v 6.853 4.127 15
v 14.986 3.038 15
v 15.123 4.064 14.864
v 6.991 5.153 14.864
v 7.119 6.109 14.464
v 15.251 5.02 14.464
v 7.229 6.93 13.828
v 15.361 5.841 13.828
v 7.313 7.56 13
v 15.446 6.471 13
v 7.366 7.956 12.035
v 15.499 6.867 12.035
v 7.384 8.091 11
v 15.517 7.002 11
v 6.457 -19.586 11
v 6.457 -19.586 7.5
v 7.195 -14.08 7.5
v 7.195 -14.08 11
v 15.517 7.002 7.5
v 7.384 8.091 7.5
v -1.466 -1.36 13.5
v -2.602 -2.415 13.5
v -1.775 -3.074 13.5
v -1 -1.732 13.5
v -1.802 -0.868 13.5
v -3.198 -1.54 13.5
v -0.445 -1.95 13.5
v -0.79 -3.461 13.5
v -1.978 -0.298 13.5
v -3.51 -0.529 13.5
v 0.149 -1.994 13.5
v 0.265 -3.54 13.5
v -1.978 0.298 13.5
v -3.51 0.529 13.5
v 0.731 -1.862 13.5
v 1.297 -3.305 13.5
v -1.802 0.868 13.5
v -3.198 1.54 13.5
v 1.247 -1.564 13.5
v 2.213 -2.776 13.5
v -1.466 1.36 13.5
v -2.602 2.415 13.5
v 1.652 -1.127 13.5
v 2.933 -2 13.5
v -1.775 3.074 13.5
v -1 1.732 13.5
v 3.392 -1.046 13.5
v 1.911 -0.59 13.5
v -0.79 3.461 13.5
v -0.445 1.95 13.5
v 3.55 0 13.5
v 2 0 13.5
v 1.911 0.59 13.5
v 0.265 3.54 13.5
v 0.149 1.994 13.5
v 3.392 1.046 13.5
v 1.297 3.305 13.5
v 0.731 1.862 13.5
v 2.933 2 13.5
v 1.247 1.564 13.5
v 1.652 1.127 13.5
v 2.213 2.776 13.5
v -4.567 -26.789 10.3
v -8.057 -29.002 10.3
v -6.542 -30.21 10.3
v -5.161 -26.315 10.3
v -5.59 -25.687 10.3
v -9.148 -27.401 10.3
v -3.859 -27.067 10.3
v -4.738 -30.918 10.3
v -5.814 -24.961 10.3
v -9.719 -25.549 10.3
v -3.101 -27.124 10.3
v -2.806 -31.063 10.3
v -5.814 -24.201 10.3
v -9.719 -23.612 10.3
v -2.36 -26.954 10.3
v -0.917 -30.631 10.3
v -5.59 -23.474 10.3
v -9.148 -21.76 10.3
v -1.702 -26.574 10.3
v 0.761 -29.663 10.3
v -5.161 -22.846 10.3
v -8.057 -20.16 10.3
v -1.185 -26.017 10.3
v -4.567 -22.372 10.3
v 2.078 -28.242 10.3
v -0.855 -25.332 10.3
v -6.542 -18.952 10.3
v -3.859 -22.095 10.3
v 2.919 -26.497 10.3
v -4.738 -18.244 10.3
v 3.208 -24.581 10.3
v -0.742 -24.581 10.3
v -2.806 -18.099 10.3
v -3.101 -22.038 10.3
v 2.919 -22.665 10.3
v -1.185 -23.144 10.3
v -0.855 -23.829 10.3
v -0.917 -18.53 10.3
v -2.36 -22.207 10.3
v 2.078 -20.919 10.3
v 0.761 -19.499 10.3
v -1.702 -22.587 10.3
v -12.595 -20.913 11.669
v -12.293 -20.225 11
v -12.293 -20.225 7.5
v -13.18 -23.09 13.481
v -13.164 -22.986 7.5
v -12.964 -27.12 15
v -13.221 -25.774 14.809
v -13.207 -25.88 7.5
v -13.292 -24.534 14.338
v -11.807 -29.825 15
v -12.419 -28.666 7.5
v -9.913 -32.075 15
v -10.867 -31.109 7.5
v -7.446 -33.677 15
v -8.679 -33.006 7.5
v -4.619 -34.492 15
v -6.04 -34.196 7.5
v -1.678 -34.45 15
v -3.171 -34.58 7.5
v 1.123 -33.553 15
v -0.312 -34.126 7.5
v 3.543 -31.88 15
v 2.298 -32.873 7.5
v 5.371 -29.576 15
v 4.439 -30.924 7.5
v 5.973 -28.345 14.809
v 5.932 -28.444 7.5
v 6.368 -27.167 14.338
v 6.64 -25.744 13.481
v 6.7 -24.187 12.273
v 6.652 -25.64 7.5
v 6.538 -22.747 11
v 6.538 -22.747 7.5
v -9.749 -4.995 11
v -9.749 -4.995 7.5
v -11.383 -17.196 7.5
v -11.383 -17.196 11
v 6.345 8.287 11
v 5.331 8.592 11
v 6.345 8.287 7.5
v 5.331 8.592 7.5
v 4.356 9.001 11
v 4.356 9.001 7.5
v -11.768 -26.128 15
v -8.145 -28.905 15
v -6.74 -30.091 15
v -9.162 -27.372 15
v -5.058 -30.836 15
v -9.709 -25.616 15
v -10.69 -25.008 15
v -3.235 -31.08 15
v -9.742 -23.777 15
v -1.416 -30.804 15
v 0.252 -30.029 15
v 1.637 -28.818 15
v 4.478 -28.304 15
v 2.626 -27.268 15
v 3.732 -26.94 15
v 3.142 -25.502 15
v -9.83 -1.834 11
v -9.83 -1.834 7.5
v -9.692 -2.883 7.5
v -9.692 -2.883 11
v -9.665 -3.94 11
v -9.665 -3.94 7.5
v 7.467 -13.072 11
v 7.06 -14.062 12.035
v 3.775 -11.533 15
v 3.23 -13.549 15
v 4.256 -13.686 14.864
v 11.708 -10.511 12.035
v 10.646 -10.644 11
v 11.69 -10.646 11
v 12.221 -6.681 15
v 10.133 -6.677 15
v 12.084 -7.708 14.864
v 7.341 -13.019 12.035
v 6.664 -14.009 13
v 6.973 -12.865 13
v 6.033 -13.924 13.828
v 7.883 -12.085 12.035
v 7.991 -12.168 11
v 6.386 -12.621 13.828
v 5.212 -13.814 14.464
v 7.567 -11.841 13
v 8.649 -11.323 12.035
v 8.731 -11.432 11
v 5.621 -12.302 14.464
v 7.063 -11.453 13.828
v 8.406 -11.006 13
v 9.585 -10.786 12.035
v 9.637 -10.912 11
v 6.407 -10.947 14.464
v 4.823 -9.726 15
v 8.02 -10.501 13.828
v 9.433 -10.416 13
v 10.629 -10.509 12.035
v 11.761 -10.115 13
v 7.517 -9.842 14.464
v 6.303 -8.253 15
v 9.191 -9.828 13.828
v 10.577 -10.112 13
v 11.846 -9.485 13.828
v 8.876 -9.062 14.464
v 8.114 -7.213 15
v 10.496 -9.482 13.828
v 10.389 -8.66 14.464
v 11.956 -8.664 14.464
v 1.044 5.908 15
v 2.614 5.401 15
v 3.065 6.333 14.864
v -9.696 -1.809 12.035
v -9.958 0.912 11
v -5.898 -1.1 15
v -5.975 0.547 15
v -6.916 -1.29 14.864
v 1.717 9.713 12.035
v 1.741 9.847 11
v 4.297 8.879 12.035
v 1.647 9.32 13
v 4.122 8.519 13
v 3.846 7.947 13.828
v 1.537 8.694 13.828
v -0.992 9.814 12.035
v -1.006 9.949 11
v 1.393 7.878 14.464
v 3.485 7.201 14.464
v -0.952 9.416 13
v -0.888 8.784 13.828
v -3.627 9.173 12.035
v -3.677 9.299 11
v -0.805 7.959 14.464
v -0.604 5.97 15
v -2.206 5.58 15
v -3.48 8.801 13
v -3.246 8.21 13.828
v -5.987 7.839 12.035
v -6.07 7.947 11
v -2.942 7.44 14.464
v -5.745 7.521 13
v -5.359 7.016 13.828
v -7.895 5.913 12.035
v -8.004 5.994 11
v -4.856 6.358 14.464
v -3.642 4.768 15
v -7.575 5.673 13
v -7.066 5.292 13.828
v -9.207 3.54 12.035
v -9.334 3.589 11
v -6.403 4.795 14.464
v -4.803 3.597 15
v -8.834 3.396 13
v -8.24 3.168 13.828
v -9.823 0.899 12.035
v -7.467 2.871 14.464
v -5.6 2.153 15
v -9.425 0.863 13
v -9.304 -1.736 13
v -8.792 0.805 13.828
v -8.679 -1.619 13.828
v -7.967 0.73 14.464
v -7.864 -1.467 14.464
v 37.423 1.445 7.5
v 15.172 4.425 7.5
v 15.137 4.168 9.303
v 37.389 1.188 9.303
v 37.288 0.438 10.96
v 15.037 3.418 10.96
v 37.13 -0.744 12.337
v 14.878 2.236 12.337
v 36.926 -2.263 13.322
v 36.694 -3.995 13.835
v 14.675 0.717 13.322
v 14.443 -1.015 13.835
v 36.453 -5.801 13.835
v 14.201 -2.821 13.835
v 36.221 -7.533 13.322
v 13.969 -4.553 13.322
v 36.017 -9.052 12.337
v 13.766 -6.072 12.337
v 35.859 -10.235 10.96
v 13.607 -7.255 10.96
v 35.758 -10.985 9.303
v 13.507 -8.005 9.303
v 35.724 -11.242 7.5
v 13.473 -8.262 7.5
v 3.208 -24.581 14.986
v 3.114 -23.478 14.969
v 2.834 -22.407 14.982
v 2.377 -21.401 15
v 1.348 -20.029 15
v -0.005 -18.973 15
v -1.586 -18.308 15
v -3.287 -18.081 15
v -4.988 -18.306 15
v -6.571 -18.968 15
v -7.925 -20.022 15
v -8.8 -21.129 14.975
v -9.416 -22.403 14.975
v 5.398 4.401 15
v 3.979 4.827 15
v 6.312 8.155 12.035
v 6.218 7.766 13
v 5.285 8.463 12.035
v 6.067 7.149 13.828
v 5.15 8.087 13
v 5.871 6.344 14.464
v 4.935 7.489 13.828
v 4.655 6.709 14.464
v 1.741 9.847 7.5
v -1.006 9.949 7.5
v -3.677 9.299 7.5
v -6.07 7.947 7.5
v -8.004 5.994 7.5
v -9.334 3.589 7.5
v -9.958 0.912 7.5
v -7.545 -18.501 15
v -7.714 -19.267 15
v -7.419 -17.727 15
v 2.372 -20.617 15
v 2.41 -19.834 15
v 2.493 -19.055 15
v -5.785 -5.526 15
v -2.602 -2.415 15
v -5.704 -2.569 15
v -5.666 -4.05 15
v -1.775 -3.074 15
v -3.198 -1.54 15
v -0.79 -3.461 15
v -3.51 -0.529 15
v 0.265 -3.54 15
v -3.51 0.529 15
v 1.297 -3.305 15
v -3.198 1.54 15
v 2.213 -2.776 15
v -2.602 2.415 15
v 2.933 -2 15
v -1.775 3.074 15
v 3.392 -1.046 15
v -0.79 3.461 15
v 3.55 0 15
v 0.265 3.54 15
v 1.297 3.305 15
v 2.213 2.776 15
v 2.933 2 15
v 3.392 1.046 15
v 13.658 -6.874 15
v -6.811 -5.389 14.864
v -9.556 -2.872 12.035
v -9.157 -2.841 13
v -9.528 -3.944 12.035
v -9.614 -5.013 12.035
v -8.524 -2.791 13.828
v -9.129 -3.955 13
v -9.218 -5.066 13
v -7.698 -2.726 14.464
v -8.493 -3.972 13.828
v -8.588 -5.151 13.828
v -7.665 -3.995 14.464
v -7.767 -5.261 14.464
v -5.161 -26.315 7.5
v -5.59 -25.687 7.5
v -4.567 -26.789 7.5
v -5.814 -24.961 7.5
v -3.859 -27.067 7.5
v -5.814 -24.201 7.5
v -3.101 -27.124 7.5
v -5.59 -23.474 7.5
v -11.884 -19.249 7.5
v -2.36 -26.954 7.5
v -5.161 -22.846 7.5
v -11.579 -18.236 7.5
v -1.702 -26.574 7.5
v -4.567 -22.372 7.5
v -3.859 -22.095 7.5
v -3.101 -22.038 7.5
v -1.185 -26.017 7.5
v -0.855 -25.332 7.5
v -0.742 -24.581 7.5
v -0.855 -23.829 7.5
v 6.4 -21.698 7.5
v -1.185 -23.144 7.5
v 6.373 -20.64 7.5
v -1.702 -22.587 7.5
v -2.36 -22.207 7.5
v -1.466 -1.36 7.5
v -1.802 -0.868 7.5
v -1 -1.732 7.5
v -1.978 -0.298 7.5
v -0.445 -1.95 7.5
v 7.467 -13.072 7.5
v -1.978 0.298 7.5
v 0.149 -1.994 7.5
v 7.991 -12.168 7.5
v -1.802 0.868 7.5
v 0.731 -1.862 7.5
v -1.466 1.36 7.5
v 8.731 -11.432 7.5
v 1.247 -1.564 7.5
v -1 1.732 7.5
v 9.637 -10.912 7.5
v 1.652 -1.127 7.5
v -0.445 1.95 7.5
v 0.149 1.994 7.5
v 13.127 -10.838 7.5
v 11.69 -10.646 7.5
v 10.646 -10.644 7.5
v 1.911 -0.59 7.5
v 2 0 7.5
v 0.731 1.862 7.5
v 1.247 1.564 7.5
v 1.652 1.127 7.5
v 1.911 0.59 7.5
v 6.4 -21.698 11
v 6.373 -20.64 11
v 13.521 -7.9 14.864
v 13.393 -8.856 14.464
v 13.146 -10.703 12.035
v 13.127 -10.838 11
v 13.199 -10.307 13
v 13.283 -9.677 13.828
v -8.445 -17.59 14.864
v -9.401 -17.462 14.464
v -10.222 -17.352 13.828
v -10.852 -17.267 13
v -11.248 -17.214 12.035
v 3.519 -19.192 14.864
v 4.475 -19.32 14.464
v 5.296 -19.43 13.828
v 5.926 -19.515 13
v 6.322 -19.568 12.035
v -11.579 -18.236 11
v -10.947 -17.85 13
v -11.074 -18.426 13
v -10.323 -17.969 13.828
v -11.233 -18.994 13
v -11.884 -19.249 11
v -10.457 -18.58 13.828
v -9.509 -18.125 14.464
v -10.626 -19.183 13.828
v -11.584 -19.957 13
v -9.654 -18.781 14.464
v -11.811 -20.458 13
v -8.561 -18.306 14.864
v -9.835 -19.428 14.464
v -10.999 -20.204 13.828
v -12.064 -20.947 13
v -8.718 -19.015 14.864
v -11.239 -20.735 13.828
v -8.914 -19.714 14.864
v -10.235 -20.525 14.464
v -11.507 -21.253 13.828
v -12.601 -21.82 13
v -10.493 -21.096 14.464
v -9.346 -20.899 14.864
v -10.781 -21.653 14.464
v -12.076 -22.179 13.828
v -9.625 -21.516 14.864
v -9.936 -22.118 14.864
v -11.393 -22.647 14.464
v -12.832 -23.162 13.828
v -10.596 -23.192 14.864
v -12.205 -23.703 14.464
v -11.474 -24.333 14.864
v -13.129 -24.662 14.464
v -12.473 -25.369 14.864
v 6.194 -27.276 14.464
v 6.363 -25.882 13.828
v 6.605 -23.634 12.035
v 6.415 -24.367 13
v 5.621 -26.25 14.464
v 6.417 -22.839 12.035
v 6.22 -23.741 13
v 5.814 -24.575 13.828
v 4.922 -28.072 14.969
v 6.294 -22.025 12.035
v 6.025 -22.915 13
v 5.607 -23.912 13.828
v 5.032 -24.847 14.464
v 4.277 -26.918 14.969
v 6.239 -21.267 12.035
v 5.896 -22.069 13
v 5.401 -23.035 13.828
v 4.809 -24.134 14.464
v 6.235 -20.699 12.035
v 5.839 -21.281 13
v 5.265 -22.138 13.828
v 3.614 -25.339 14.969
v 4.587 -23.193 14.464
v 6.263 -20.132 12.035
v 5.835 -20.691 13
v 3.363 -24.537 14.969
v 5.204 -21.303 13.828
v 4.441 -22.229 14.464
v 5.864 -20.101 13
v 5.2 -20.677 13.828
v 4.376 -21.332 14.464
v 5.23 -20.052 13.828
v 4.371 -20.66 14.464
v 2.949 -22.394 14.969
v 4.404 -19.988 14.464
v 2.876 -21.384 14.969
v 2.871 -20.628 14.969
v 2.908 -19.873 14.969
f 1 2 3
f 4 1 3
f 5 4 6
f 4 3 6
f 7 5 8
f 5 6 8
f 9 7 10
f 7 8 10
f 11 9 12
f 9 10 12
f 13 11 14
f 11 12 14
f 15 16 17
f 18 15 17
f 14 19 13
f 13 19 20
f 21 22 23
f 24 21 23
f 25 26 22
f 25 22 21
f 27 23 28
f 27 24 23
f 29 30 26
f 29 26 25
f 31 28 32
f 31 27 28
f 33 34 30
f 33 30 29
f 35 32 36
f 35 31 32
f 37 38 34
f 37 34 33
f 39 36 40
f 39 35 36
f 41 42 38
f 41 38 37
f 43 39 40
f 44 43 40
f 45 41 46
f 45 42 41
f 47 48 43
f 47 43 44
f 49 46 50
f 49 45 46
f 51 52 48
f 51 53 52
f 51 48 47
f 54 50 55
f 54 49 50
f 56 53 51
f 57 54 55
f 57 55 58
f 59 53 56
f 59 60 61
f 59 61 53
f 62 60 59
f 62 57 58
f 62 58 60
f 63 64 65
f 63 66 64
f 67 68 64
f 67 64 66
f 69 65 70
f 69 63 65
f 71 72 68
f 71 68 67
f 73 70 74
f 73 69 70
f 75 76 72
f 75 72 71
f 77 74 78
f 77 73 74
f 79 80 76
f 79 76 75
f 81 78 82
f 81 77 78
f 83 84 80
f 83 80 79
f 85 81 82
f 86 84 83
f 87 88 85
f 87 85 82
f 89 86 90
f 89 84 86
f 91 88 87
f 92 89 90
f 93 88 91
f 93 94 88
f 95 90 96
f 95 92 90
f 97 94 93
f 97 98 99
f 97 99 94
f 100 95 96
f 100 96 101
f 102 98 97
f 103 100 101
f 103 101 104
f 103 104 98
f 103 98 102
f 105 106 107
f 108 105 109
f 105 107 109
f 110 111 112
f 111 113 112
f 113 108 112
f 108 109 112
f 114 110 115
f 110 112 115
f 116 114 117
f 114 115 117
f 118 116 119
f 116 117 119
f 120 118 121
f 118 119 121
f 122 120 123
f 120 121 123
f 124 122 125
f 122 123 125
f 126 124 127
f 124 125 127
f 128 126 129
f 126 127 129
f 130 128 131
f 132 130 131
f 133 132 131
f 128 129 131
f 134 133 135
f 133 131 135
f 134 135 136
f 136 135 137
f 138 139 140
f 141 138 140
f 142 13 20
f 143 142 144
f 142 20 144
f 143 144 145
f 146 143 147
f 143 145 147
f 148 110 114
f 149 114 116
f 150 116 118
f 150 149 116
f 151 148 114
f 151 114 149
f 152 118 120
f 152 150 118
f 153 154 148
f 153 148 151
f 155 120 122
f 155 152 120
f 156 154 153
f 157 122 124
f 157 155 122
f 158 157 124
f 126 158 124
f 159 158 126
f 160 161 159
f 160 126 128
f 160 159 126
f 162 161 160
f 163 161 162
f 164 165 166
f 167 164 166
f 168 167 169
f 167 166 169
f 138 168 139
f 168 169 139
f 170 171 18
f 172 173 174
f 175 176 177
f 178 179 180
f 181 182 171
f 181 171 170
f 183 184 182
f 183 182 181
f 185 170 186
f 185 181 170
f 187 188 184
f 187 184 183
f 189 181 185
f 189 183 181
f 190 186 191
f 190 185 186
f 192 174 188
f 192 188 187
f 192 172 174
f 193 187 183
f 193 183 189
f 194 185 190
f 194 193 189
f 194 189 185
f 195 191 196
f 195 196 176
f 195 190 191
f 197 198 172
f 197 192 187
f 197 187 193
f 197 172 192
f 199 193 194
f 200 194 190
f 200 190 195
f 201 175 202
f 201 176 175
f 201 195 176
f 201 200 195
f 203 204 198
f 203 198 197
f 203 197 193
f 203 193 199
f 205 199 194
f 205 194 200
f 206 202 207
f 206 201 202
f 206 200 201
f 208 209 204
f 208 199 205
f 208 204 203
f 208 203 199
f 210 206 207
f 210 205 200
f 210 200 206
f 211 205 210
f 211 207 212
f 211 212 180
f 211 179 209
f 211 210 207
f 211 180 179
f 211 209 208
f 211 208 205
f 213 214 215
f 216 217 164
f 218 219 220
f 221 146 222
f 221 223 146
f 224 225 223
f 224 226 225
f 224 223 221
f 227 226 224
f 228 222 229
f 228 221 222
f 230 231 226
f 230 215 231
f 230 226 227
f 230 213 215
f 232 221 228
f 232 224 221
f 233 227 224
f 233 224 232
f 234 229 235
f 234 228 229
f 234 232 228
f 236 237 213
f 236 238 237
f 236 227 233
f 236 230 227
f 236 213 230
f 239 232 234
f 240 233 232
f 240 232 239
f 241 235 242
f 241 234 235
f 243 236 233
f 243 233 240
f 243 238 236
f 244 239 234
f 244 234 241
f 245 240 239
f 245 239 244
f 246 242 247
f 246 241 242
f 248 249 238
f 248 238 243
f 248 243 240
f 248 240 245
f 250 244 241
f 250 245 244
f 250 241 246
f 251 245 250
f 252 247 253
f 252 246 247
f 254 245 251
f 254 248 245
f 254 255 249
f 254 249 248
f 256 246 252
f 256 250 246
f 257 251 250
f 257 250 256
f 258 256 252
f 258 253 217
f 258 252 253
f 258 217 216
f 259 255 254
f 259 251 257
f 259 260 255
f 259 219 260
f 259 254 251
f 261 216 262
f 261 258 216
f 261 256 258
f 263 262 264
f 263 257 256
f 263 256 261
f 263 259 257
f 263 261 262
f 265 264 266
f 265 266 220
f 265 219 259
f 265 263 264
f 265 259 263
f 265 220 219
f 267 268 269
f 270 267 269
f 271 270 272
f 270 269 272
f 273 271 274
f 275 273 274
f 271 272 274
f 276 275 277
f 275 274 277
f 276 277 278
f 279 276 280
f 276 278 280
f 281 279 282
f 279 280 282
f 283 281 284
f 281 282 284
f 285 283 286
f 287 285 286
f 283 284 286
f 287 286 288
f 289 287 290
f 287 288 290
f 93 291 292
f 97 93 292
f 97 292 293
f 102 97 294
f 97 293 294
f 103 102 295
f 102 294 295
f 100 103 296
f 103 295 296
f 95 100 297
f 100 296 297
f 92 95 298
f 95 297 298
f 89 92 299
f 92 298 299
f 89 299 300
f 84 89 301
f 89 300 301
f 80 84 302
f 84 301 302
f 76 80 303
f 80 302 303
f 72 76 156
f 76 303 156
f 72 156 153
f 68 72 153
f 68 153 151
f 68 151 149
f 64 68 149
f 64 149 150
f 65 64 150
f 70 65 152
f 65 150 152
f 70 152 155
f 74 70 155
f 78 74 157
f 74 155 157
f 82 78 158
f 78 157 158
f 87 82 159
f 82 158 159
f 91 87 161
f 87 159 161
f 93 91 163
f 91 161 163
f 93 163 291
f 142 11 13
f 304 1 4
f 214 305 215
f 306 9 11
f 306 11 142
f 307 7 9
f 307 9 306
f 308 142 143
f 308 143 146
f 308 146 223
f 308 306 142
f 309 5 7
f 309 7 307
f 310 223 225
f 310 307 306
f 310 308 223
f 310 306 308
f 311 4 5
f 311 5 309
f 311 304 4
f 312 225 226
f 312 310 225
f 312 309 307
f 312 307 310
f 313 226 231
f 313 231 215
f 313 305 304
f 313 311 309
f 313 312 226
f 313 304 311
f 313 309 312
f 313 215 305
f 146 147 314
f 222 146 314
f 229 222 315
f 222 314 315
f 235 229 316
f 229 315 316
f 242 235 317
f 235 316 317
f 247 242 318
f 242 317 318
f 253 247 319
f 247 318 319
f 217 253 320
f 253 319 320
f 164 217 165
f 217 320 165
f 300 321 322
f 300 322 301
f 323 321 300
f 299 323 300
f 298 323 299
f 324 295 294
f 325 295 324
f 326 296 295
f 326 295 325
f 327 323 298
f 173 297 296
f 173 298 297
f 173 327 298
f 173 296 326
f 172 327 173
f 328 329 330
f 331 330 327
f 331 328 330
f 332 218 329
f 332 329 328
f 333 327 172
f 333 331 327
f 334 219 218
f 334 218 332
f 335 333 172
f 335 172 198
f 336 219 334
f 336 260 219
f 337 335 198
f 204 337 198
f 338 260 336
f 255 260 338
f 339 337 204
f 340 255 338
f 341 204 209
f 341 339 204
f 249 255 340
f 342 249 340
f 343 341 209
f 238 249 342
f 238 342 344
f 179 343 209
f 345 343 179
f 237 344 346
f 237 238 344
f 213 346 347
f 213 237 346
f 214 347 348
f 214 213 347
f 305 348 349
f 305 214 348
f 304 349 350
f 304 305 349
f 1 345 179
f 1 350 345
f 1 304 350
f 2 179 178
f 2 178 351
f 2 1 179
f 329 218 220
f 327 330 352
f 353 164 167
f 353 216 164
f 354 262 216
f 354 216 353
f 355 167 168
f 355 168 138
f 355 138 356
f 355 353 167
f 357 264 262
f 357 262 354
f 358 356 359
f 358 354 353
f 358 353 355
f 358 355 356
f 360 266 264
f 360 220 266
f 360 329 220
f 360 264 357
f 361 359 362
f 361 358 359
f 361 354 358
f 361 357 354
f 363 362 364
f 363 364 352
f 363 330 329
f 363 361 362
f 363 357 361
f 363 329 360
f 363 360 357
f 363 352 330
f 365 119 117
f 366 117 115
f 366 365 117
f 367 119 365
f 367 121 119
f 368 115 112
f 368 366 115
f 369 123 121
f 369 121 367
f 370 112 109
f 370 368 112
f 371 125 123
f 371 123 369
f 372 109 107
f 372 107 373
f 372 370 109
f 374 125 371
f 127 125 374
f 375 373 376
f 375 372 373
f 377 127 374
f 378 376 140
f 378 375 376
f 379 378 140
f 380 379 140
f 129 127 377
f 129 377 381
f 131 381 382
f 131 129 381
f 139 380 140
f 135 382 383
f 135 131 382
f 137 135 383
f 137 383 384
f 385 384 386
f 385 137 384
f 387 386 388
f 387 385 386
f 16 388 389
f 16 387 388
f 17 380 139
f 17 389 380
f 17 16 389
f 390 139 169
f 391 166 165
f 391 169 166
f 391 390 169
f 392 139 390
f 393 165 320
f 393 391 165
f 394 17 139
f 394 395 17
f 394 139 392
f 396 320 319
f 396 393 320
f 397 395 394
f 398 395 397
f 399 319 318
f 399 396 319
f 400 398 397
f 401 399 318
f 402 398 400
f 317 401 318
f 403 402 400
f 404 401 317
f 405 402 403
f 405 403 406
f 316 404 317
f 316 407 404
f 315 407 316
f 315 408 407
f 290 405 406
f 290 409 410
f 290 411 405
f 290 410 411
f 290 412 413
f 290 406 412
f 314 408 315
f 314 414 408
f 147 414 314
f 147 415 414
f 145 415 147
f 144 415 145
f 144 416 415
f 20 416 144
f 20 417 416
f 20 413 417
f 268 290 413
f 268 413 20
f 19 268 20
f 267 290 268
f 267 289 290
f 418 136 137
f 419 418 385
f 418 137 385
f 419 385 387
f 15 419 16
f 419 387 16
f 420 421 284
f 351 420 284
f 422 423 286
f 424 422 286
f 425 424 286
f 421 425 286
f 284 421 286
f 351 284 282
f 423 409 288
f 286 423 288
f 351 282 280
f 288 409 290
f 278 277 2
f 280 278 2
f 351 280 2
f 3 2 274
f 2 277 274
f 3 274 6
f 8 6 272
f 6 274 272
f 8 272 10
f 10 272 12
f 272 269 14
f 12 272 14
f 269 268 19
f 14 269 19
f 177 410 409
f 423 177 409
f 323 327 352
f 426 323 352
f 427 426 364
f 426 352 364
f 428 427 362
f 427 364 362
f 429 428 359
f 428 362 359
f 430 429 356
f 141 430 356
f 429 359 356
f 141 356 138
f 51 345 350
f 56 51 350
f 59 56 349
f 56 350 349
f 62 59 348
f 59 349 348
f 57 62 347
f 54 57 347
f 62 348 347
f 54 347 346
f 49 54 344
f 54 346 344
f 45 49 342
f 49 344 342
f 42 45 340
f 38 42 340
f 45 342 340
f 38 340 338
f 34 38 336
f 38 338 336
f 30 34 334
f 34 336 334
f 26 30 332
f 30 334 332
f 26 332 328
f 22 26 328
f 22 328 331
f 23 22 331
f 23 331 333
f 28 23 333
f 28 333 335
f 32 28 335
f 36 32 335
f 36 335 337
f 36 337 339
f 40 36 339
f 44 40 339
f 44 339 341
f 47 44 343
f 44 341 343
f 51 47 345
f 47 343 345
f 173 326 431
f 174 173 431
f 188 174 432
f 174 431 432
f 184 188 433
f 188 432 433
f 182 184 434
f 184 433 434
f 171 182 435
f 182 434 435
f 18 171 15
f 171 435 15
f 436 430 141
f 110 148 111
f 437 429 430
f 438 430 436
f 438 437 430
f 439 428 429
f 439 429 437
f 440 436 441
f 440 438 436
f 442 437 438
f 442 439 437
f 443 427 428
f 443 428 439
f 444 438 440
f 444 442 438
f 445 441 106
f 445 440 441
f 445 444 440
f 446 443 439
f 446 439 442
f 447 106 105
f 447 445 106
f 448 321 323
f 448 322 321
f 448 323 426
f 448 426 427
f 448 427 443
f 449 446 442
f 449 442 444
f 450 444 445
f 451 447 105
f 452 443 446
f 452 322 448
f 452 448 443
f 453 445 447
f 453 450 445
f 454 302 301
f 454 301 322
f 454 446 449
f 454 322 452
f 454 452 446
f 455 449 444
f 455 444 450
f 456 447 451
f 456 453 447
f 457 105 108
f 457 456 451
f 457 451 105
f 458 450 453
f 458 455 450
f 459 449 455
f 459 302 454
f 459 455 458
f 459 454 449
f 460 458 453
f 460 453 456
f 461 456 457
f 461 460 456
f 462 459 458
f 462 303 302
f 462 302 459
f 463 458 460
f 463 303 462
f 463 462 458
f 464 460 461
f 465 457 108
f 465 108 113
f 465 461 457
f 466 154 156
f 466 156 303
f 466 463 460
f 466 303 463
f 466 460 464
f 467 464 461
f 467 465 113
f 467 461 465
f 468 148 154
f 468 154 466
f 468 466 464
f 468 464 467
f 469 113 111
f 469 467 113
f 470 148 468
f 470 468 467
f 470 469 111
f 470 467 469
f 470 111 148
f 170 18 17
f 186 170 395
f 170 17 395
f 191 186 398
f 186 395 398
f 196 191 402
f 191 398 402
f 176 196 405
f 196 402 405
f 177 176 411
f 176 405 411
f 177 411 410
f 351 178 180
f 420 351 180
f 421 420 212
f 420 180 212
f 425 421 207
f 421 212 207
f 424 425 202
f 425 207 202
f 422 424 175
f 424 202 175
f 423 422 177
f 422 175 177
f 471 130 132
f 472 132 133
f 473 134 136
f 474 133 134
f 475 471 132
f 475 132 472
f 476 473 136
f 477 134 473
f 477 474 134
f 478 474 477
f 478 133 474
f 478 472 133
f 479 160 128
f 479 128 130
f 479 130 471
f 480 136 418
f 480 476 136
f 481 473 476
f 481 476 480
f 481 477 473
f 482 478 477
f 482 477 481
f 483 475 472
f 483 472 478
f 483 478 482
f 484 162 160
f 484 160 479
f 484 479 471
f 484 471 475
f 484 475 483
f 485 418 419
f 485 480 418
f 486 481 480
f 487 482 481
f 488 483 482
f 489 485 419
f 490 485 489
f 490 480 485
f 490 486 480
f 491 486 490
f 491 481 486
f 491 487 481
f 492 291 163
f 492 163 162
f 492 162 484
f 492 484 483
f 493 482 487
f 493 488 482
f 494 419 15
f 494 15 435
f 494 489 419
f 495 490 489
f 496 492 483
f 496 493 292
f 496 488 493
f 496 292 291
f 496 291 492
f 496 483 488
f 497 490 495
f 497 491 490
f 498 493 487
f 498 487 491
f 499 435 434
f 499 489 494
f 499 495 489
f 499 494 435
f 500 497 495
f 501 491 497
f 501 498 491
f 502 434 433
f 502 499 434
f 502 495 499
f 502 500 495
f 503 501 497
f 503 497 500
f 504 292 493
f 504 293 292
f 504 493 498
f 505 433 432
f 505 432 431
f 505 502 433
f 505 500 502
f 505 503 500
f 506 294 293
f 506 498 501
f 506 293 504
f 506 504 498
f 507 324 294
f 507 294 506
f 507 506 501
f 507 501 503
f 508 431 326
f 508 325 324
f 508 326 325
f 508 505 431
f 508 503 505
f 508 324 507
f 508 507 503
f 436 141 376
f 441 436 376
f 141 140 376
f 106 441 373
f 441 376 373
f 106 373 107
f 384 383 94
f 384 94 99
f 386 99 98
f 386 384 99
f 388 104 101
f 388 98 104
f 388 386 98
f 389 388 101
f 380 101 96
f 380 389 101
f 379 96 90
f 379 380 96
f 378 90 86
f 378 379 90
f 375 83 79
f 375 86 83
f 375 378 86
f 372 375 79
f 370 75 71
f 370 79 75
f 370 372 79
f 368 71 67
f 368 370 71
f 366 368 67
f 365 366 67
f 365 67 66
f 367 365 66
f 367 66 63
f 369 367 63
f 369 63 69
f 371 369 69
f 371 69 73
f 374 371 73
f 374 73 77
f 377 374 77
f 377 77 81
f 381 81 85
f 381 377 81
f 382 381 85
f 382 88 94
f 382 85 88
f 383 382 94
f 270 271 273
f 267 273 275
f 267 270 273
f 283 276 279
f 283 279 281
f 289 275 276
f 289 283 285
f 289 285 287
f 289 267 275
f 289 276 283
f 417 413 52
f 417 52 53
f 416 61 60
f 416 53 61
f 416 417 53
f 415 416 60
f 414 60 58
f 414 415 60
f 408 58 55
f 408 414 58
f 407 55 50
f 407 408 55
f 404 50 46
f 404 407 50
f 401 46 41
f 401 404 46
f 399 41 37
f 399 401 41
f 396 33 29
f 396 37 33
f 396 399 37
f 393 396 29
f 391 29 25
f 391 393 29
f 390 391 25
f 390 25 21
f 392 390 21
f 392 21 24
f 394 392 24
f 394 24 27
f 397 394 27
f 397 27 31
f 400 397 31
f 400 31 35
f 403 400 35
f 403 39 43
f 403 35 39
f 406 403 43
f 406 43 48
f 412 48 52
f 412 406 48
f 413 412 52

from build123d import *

# Parameters (mm, degrees)
SKETCH_5_R          = 2
SKETCH_5_R_2        = 2.55
EXTRUDE_3_DEPTH     = 15
FILLET_4_R          = 4
SKETCH_6_R          = 6.4
EXTRUDE_4_DEPTH     = 22.45
SKETCH_7_R          = 6.5
CUT_EXTRUDE_1_DEPTH = 4.7
CUT_EXTRUDE_START   = -4.7
SKETCH_8_R          = 6.5
CUT_EXTRUDE_2_DEPTH = 4.7
SKETCH_9_W          = 7.5
SKETCH_9_H          = 50
CUT_EXTRUDE_3_DEPTH = 60.938467095
SKETCH_10_R         = 3.55
CUT_EXTRUDE_4_DEPTH = 1.5


with BuildPart() as part:
    # 草图5 → 凸台-拉伸3 (new body)
    with BuildSketch(Plane.XY):
        with BuildLine():
            Line((15.516814201, 7.002212297), (7.384422843, 8.091371903))
            ThreePointArc((7.384422843, 8.091371903), (5.833974337, 8.425935573), (4.355928265, 9.00143816))
            ThreePointArc((4.355928265, 9.00143816), (-6.069854623, 7.947129347), (-9.830420232, -1.833804259))
            ThreePointArc((-9.830420232, -1.833804259), (-9.664128327, -3.411197812), (-9.749336047, -4.995042206))
            Line((-9.749336047, -4.995042206), (-11.383433357, -17.196301568))
            ThreePointArc((-11.383433357, -17.196301568), (-11.717997026, -18.746750074), (-12.293499614, -20.224796146))
            ThreePointArc((-12.293499614, -20.224796146), (-4.619495141, -34.492228828), (6.538358778, -22.746920152))
            ThreePointArc((6.538358778, -22.746920152), (6.372066873, -21.169526599), (6.457274593, -19.585682205))
            Line((6.457274593, -19.585682205), (7.194690182, -14.07964606))
            ThreePointArc((7.194690182, -14.07964606), (8.731350099, -11.431767797), (11.690265423, -10.646017769))
            Line((11.690265423, -10.646017769), (13.127433564, -10.838495653))
            Line((13.127433564, -10.838495653), (15.516814201, 7.002212297))
        make_face()
        Circle(SKETCH_5_R, mode=Mode.SUBTRACT)
        with Locations((-3.292061454, -24.580724411)):
            Circle(SKETCH_5_R_2, mode=Mode.SUBTRACT)
    extrude(amount=EXTRUDE_3_DEPTH)

    # 圆角4
    # the kernel refuses this fillet: 4 mm, written as the material it takes off along each edge
    with BuildSketch(Plane(origin=(-19.660840464, -3.667608519, 15), x_dir=(0.9830420232040514, 0.18338042593168238, 0), z_dir=(-0.18338042593168238, 0.9830420232040514, 0))) as fillet_4_piece_1:
        with BuildLine():
            CenterArc((10 + FILLET_4_R, FILLET_4_R), FILLET_4_R, 180, 90)
            Line((10 + FILLET_4_R, 0), (10, 0))
            Line((10, 0), (10, FILLET_4_R))
        make_face()
    revolve(axis=Axis((-19.660840464, -3.667608519, 15), (0, 0, -1)), revolution_arc=18.194872339, mode=Mode.SUBTRACT)
    with BuildSketch(Plane(origin=(25.428318618, 5.67477861, 0), x_dir=(0, 0, 1), z_dir=(-0.9911504416884656, 0.132743368726124, 0))) as fillet_4_piece_2:
        with BuildLine():
            CenterArc((FILLET_4_R, -FILLET_4_R), FILLET_4_R, 90, 90)
            Line((0, -FILLET_4_R), (0, 0))
            Line((0, 0), (FILLET_4_R, 0))
        make_face()
    extrude(amount=18.205002002, mode=Mode.SUBTRACT)
    with BuildSketch(Plane(origin=(11.690265423, -10.646017769, 0), x_dir=(0, 0, 1), z_dir=(0.9911504416883519, -0.13274336872697298, 0))) as fillet_4_piece_3:
        with BuildLine():
            CenterArc((FILLET_4_R, -FILLET_4_R), FILLET_4_R, 90, 90)
            Line((0, -FILLET_4_R), (0, 0))
            Line((0, 0), (FILLET_4_R, 0))
        make_face()
    extrude(amount=11.45, mode=Mode.SUBTRACT)
    with BuildSketch(Plane(origin=(11.159291948, -14.610619535, 0), x_dir=(-0.9911504416882816, 0.13274336872749704, 0), z_dir=(-0.13274336872749704, -0.9911504416882816, 0))) as fillet_4_piece_4:
        with BuildLine():
            CenterArc((4 + FILLET_4_R, -FILLET_4_R), FILLET_4_R, 90, 90)
            Line((4 + FILLET_4_R, 0), (4, 0))
            Line((4, 0), (4, -FILLET_4_R))
        make_face()
    revolve(axis=Axis((11.159291948, -14.610619535, 0), (0, 0, -1)), revolution_arc=90, mode=Mode.SUBTRACT)
    with BuildSketch(Plane(origin=(6.457274593, -19.585682205, 0), x_dir=(0, 0, 1), z_dir=(0.13274336872730183, 0.9911504416883078, 0))) as fillet_4_piece_5:
        with BuildLine():
            CenterArc((FILLET_4_R, -FILLET_4_R), FILLET_4_R, 90, 90)
            Line((0, -FILLET_4_R), (0, 0))
            Line((0, 0), (FILLET_4_R, 0))
        make_face()
    extrude(amount=5.555197186, mode=Mode.SUBTRACT)
    with BuildSketch(Plane(origin=(16.368779012, -20.913115892, 0), x_dir=(-0.3768153606688204, -0.9262883913576953, 0), z_dir=(0.9262883913576953, -0.3768153606688204, 0))) as fillet_4_piece_6:
        with BuildLine():
            CenterArc((10.000000001 + FILLET_4_R, -FILLET_4_R), FILLET_4_R, 90, 90)
            Line((10.000000001 + FILLET_4_R, 0), (10.000000001, 0))
            Line((10.000000001, 0), (10.000000001, -FILLET_4_R))
        make_face()
    revolve(axis=Axis((16.368779012, -20.913115892, 0), (0, 0, -1)), revolution_arc=75.491592277, mode=Mode.SUBTRACT)
    with BuildSketch(Plane(origin=(-9.749336047, -4.995042206, 15), x_dir=(0, 0, -1), z_dir=(-0.13274336872713738, -0.9911504416883298, 0))) as fillet_4_piece_7:
        with BuildLine():
            CenterArc((FILLET_4_R, FILLET_4_R), FILLET_4_R, 180, 90)
            Line((0, FILLET_4_R), (0, 0))
            Line((0, 0), (FILLET_4_R, 0))
        make_face()
    extrude(amount=12.310199188, mode=Mode.SUBTRACT)
    with BuildSketch(Plane(origin=(-21.294937774, -15.868867881, 0), x_dir=(0.9911504416879034, -0.132743368730321, 0), z_dir=(0.132743368730321, 0.9911504416879034, 0))) as fillet_4_piece_8:
        with BuildLine():
            CenterArc((10 + FILLET_4_R, -FILLET_4_R), FILLET_4_R, 90, 90)
            Line((10 + FILLET_4_R, 0), (10, 0))
            Line((10, 0), (10, -FILLET_4_R))
        make_face()
    revolve(axis=Axis((-21.294937774, -15.868867881, 0), (0, 0, -1)), revolution_arc=75.491592288, mode=Mode.SUBTRACT)
    with BuildSketch(Plane(origin=(-9.749336047, -4.995042206, 0), x_dir=(0, 0, 1), z_dir=(-0.13274336872713738, -0.9911504416883298, 0))) as fillet_4_piece_9:
        with BuildLine():
            CenterArc((FILLET_4_R, -FILLET_4_R), FILLET_4_R, 90, 90)
            Line((0, -FILLET_4_R), (0, 0))
            Line((0, 0), (FILLET_4_R, 0))
        make_face()
    extrude(amount=12.310199188, mode=Mode.SUBTRACT)
    with BuildSketch(Plane(origin=(-19.660840464, -3.667608519, 0), x_dir=(0.9830420232040514, 0.18338042593168238, 0), z_dir=(-0.18338042593168238, 0.9830420232040514, 0))) as fillet_4_piece_10:
        with BuildLine():
            CenterArc((10 + FILLET_4_R, -FILLET_4_R), FILLET_4_R, 90, 90)
            Line((10 + FILLET_4_R, 0), (10, 0))
            Line((10, 0), (10, -FILLET_4_R))
        make_face()
    revolve(axis=Axis((-19.660840464, -3.667608519, 0), (0, 0, -1)), revolution_arc=18.194872339, mode=Mode.SUBTRACT)
    with BuildSketch(Plane(origin=(0, 0, 0), x_dir=(0.43559282651439474, 0.900143816003421, 0), z_dir=(0.900143816003421, -0.43559282651439474, 0))) as fillet_4_piece_11:
        with BuildLine():
            CenterArc((10 - FILLET_4_R, FILLET_4_R), FILLET_4_R, 270, 90)
            Line((10 - FILLET_4_R, 0), (10, 0))
            Line((10, 0), (10, FILLET_4_R))
        make_face()
    revolve(axis=Axis((0, 0, 0), (0, 0, 1)), revolution_arc=126.389744678, mode=Mode.SUBTRACT)
    with BuildSketch(Plane(origin=(8.71185653, 18.00287632, 0), x_dir=(-0.13274336873032264, -0.9911504416879031, 0), z_dir=(0.9911504416879031, -0.13274336873032264, 0))) as fillet_4_piece_12:
        with BuildLine():
            CenterArc((10 + FILLET_4_R, -FILLET_4_R), FILLET_4_R, 90, 90)
            Line((10 + FILLET_4_R, 0), (10, 0))
            Line((10, 0), (10, -FILLET_4_R))
        make_face()
    revolve(axis=Axis((8.71185653, 18.00287632, 0), (0, 0, -1)), revolution_arc=18.194872339, mode=Mode.SUBTRACT)
    with BuildSketch(Plane(origin=(-21.294937774, -15.868867881, 15), x_dir=(0.9911504416879034, -0.132743368730321, 0), z_dir=(0.132743368730321, 0.9911504416879034, 0))) as fillet_4_piece_13:
        with BuildLine():
            CenterArc((10 + FILLET_4_R, FILLET_4_R), FILLET_4_R, 180, 90)
            Line((10 + FILLET_4_R, 0), (10, 0))
            Line((10, 0), (10, FILLET_4_R))
        make_face()
    revolve(axis=Axis((-21.294937774, -15.868867881, 15), (0, 0, -1)), revolution_arc=75.491592288, mode=Mode.SUBTRACT)
    with BuildSketch(Plane(origin=(16.368779012, -20.913115892, 15), x_dir=(-0.3768153606688204, -0.9262883913576953, 0), z_dir=(0.9262883913576953, -0.3768153606688204, 0))) as fillet_4_piece_14:
        with BuildLine():
            CenterArc((10.000000001 + FILLET_4_R, FILLET_4_R), FILLET_4_R, 180, 90)
            Line((10.000000001 + FILLET_4_R, 0), (10.000000001, 0))
            Line((10.000000001, 0), (10.000000001, FILLET_4_R))
        make_face()
    revolve(axis=Axis((16.368779012, -20.913115892, 15), (0, 0, -1)), revolution_arc=75.491592277, mode=Mode.SUBTRACT)
    with BuildSketch(Plane(origin=(6.457274593, -19.585682205, 15), x_dir=(0, 0, -1), z_dir=(0.13274336872730183, 0.9911504416883078, 0))) as fillet_4_piece_15:
        with BuildLine():
            CenterArc((FILLET_4_R, FILLET_4_R), FILLET_4_R, 180, 90)
            Line((0, FILLET_4_R), (0, 0))
            Line((0, 0), (FILLET_4_R, 0))
        make_face()
    extrude(amount=5.555197186, mode=Mode.SUBTRACT)
    with BuildSketch(Plane(origin=(11.159291948, -14.610619535, 15), x_dir=(-0.9911504416882816, 0.13274336872749704, 0), z_dir=(-0.13274336872749704, -0.9911504416882816, 0))) as fillet_4_piece_16:
        with BuildLine():
            CenterArc((4 + FILLET_4_R, FILLET_4_R), FILLET_4_R, 180, 90)
            Line((4 + FILLET_4_R, 0), (4, 0))
            Line((4, 0), (4, FILLET_4_R))
        make_face()
    revolve(axis=Axis((11.159291948, -14.610619535, 15), (0, 0, -1)), revolution_arc=90, mode=Mode.SUBTRACT)
    with BuildSketch(Plane(origin=(11.690265423, -10.646017769, 15), x_dir=(0, 0, -1), z_dir=(0.9911504416883519, -0.13274336872697298, 0))) as fillet_4_piece_17:
        with BuildLine():
            CenterArc((FILLET_4_R, FILLET_4_R), FILLET_4_R, 180, 90)
            Line((0, FILLET_4_R), (0, 0))
            Line((0, 0), (FILLET_4_R, 0))
        make_face()
    extrude(amount=11.45, mode=Mode.SUBTRACT)
    with BuildSketch(Plane(origin=(25.428318618, 5.67477861, 15), x_dir=(0, 0, -1), z_dir=(-0.9911504416884656, 0.132743368726124, 0))) as fillet_4_piece_18:
        with BuildLine():
            CenterArc((FILLET_4_R, FILLET_4_R), FILLET_4_R, 180, 90)
            Line((0, FILLET_4_R), (0, 0))
            Line((0, 0), (FILLET_4_R, 0))
        make_face()
    extrude(amount=18.205002002, mode=Mode.SUBTRACT)
    with BuildSketch(Plane(origin=(8.71185653, 18.00287632, 15), x_dir=(-0.13274336873032264, -0.9911504416879031, 0), z_dir=(0.9911504416879031, -0.13274336873032264, 0))) as fillet_4_piece_19:
        with BuildLine():
            CenterArc((10 + FILLET_4_R, FILLET_4_R), FILLET_4_R, 180, 90)
            Line((10 + FILLET_4_R, 0), (10, 0))
            Line((10, 0), (10, FILLET_4_R))
        make_face()
    revolve(axis=Axis((8.71185653, 18.00287632, 15), (0, 0, -1)), revolution_arc=18.194872339, mode=Mode.SUBTRACT)
    with BuildSketch(Plane(origin=(0, 0, 15), x_dir=(0.43559282651439474, 0.900143816003421, 0), z_dir=(0.900143816003421, -0.43559282651439474, 0))) as fillet_4_piece_20:
        with BuildLine():
            CenterArc((10 - FILLET_4_R, -FILLET_4_R), FILLET_4_R, 0, 90)
            Line((10 - FILLET_4_R, 0), (10, 0))
            Line((10, 0), (10, -FILLET_4_R))
        make_face()
    revolve(axis=Axis((0, 0, 15), (0, 0, 1)), revolution_arc=126.389744678, mode=Mode.SUBTRACT)

    # 草图6 → 凸台-拉伸4 (add)
    with BuildSketch(Plane(origin=(14.322123882, -1.918141678, 0), x_dir=(0, 0, -1), z_dir=(0.9911504416882867, -0.13274336872745984, 0))):
        with Locations(Location((-7.5, 0, 0), (0, 0, 270))):
            Circle(SKETCH_6_R)
    extrude(amount=EXTRUDE_4_DEPTH)

    # 草图7 → 切除-拉伸1 (cut)
    with BuildSketch(Plane.XY.offset(15)):
        with Locations((-3.292061454, -24.580724411)):
            Circle(SKETCH_7_R)
    extrude(amount=-CUT_EXTRUDE_1_DEPTH, mode=Mode.SUBTRACT)

    # 草图8 → 切除-拉伸2 (cut)
    with BuildSketch(Plane(origin=(0, 0, 0), x_dir=(-1, 0, 0), z_dir=(0, 0, -1)).offset(CUT_EXTRUDE_START)):
        with Locations(Location((3.292061454, -24.580724411, 0), (0, 0, 180))):
            Circle(SKETCH_8_R)
    extrude(amount=CUT_EXTRUDE_2_DEPTH, mode=Mode.SUBTRACT)

    # 草图9 → 切除-拉伸3 (cut, through all)
    with BuildSketch(Plane(origin=(36.573451298, -4.898230306, 0), x_dir=(0, 0, -1), z_dir=(0.9911504416882867, -0.13274336872745987, 0))):
        with Locations((-3.75, -9.800195184)):
            Rectangle(SKETCH_9_W, SKETCH_9_H)
    extrude(amount=-CUT_EXTRUDE_3_DEPTH, mode=Mode.SUBTRACT)

    # 草图10 → 切除-拉伸4 (cut)
    with BuildSketch(Plane.XY.offset(15)):
        Circle(SKETCH_10_R)
    extrude(amount=-CUT_EXTRUDE_4_DEPTH, mode=Mode.SUBTRACT)


solid = part.part
